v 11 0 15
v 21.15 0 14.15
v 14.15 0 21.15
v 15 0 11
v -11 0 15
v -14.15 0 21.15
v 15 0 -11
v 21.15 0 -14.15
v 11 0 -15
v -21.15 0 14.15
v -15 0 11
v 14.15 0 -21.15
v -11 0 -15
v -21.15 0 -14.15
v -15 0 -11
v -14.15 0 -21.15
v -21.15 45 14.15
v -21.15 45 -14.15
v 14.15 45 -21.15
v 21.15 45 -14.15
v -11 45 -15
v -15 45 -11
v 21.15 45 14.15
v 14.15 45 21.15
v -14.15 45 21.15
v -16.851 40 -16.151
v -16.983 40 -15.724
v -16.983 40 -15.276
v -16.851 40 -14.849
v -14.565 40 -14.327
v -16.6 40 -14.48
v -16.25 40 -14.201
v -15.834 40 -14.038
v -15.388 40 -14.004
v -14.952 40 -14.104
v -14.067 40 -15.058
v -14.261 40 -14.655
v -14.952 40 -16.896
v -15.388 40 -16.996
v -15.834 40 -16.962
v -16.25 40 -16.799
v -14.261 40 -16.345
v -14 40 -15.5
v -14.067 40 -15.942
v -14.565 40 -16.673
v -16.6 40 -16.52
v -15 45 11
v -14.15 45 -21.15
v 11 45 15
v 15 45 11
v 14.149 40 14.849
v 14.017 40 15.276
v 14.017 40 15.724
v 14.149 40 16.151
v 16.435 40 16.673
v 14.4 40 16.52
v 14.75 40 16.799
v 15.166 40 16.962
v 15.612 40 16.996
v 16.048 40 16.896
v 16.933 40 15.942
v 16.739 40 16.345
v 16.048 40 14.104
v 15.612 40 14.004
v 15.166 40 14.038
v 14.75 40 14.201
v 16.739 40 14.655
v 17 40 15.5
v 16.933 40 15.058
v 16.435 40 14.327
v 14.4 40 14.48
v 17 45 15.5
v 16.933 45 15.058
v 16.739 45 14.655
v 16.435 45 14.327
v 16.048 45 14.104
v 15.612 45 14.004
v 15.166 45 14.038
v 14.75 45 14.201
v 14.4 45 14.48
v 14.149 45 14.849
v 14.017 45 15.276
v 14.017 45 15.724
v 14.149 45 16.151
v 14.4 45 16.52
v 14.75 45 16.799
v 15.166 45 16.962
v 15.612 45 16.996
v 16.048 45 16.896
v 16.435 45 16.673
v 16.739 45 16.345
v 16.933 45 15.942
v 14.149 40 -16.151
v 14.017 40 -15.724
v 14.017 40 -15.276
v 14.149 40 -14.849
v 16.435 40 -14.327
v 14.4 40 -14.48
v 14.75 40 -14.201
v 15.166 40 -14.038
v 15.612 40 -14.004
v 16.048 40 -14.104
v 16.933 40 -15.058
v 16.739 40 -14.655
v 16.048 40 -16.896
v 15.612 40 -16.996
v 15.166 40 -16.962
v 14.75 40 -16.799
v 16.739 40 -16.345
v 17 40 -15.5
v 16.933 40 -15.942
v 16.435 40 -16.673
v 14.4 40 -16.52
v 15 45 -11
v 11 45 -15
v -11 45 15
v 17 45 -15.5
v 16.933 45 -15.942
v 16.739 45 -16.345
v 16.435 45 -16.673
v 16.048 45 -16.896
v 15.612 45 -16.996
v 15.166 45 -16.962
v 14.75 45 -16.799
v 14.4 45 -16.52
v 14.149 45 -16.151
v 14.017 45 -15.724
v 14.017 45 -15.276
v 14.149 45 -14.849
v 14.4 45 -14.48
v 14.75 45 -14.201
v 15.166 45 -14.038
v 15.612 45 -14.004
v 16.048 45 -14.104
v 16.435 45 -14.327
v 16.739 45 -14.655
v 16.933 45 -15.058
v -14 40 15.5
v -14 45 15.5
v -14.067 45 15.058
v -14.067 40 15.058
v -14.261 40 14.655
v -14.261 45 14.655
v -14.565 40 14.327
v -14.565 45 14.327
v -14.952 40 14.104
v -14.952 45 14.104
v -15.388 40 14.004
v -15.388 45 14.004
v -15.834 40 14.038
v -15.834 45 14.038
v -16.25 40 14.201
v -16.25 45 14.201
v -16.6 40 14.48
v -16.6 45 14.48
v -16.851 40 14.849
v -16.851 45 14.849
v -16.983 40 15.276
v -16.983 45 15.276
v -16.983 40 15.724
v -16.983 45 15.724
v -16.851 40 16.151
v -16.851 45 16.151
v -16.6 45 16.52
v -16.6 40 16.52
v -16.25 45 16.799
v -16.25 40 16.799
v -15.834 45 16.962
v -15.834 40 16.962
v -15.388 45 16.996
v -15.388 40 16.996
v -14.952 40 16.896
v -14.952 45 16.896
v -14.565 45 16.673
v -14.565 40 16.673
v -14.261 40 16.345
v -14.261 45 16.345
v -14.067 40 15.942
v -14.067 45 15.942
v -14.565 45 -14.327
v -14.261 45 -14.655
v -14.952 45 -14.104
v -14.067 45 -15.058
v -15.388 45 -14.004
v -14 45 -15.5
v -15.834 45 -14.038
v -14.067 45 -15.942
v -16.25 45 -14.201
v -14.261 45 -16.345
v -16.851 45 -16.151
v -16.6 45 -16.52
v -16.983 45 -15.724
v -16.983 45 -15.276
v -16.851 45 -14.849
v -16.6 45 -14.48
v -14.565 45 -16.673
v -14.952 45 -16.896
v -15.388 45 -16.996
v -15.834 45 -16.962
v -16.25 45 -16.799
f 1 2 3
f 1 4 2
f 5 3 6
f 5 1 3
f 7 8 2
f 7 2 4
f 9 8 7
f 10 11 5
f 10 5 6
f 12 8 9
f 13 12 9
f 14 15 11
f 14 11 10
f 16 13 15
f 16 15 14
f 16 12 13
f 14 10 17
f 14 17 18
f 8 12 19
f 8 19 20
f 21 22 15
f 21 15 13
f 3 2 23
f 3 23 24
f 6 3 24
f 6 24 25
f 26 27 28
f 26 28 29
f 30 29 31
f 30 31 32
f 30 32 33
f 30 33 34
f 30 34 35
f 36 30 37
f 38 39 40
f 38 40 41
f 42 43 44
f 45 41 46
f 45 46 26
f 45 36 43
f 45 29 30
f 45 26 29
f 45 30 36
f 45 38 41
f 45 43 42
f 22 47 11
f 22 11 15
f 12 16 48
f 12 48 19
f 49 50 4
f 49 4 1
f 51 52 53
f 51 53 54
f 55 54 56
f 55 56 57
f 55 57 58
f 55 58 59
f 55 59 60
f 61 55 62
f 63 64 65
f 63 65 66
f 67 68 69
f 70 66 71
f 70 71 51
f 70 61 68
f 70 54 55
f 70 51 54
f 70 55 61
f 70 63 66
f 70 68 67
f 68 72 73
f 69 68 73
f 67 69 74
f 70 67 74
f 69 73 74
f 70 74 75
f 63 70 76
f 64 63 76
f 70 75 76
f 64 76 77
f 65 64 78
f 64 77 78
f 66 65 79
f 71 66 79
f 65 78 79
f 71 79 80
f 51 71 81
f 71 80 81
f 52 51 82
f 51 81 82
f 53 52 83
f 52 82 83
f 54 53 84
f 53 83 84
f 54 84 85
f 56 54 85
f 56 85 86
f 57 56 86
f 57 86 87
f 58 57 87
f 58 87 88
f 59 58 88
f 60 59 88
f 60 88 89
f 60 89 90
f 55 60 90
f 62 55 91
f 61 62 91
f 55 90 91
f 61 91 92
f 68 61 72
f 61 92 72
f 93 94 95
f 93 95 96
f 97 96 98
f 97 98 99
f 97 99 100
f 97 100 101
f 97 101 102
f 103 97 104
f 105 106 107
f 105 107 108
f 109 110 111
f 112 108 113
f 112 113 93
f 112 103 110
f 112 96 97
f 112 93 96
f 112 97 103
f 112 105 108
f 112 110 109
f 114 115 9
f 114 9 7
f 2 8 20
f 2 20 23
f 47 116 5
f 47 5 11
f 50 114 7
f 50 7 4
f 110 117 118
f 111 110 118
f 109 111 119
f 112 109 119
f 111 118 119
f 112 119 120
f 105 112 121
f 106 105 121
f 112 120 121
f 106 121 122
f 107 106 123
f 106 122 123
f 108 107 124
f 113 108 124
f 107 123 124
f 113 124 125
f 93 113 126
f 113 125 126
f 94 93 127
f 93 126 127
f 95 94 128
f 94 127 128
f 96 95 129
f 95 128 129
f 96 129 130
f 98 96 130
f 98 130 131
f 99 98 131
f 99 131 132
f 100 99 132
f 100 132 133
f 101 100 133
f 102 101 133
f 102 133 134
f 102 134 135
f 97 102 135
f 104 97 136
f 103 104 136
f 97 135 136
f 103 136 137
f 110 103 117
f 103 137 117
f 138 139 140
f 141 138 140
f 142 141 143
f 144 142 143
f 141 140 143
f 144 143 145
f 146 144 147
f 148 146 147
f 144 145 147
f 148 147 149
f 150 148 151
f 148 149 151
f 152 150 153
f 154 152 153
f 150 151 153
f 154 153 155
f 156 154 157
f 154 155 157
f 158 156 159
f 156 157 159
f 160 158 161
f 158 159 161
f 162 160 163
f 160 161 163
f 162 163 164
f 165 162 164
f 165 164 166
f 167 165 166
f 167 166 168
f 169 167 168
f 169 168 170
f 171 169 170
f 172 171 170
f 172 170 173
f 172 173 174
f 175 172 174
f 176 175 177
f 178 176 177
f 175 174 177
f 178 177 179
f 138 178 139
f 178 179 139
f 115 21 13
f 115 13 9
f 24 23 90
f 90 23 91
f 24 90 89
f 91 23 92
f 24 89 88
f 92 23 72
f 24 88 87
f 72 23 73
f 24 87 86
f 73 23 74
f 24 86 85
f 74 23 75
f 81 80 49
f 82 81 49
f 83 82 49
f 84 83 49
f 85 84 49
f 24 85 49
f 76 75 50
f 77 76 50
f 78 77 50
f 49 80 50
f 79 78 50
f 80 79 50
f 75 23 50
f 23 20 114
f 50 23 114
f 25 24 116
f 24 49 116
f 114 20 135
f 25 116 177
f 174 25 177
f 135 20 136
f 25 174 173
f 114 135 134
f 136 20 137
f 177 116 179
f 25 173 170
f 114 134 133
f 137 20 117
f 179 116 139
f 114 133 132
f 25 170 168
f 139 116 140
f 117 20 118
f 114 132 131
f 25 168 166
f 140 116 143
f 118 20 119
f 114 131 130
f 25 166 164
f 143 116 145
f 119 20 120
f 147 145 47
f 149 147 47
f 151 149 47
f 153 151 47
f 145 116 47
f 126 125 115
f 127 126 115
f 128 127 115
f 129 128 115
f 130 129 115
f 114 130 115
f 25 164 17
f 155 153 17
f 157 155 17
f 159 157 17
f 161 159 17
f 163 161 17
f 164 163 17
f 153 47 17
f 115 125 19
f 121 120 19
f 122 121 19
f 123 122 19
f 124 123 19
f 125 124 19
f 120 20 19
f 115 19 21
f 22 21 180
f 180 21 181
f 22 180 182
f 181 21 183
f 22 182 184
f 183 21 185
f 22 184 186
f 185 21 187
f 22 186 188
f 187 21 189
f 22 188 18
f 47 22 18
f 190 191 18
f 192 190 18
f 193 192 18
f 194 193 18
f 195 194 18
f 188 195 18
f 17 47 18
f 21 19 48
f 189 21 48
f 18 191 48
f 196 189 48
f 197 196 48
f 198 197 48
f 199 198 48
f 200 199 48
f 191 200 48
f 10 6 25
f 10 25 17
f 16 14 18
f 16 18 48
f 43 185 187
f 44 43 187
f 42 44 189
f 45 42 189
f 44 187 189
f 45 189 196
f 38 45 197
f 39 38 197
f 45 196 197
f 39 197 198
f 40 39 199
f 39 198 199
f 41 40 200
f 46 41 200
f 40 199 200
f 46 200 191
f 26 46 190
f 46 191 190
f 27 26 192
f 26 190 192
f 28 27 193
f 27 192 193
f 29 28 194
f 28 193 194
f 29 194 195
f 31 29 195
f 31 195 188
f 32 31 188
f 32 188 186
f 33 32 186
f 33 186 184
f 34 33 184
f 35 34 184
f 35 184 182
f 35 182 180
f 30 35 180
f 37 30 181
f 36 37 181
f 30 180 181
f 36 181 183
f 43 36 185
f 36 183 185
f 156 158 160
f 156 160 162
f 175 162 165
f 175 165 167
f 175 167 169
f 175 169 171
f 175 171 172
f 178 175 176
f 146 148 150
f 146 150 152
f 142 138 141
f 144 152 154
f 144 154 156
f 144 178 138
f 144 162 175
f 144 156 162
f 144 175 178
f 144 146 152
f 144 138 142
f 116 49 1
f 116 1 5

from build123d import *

# Parameters (mm, degrees)
BOSS_EXTRUDE1_DEPTH = 45
SKETCH2_R           = 1.5
CUT_EXTRUDE1_DEPTH  = 5
CUT_EXTRUDE3_DEPTH  = 45


with BuildPart() as part:
    # Sketch1 → Boss-Extrude1 (new body)
    with BuildSketch(Plane(origin=(0, 0, 0), x_dir=(1, 0, 0), z_dir=(0, 1, 0))):
        Polygon((-21.15, 14.15), (-14.15, 21.15), (14.15, 21.15), (21.15, 14.15), (21.15, -14.15), (14.15, -21.15), (-14.15, -21.15), (-21.15, -14.15), align=None)
    extrude(amount=BOSS_EXTRUDE1_DEPTH)

    # Sketch2 → Cut-Extrude1 (cut)
    with BuildSketch(Plane(origin=(0, 45, 0), x_dir=(1, 0, 0), z_dir=(0, 1, 0))):
        with Locations((-15.5, 15.5)):
            Circle(SKETCH2_R)
        with Locations((15.5, 15.5)):
            Circle(SKETCH2_R)
        with Locations((-15.5, -15.5)):
            Circle(SKETCH2_R)
        with Locations((15.5, -15.5)):
            Circle(SKETCH2_R)
    extrude(amount=-CUT_EXTRUDE1_DEPTH, mode=Mode.SUBTRACT)

    # Sketch3 → Cut-Extrude3 (cut)
    with BuildSketch(Plane(origin=(0, 45, 0), x_dir=(1, 0, 0), z_dir=(0, 1, 0))):
        Polygon((-15, 11), (-11, 15), (11, 15), (15, 11), (15, -11), (11, -15), (-11, -15), (-15, -11), align=None)
    extrude(amount=-CUT_EXTRUDE3_DEPTH, mode=Mode.SUBTRACT)


solid = part.part
